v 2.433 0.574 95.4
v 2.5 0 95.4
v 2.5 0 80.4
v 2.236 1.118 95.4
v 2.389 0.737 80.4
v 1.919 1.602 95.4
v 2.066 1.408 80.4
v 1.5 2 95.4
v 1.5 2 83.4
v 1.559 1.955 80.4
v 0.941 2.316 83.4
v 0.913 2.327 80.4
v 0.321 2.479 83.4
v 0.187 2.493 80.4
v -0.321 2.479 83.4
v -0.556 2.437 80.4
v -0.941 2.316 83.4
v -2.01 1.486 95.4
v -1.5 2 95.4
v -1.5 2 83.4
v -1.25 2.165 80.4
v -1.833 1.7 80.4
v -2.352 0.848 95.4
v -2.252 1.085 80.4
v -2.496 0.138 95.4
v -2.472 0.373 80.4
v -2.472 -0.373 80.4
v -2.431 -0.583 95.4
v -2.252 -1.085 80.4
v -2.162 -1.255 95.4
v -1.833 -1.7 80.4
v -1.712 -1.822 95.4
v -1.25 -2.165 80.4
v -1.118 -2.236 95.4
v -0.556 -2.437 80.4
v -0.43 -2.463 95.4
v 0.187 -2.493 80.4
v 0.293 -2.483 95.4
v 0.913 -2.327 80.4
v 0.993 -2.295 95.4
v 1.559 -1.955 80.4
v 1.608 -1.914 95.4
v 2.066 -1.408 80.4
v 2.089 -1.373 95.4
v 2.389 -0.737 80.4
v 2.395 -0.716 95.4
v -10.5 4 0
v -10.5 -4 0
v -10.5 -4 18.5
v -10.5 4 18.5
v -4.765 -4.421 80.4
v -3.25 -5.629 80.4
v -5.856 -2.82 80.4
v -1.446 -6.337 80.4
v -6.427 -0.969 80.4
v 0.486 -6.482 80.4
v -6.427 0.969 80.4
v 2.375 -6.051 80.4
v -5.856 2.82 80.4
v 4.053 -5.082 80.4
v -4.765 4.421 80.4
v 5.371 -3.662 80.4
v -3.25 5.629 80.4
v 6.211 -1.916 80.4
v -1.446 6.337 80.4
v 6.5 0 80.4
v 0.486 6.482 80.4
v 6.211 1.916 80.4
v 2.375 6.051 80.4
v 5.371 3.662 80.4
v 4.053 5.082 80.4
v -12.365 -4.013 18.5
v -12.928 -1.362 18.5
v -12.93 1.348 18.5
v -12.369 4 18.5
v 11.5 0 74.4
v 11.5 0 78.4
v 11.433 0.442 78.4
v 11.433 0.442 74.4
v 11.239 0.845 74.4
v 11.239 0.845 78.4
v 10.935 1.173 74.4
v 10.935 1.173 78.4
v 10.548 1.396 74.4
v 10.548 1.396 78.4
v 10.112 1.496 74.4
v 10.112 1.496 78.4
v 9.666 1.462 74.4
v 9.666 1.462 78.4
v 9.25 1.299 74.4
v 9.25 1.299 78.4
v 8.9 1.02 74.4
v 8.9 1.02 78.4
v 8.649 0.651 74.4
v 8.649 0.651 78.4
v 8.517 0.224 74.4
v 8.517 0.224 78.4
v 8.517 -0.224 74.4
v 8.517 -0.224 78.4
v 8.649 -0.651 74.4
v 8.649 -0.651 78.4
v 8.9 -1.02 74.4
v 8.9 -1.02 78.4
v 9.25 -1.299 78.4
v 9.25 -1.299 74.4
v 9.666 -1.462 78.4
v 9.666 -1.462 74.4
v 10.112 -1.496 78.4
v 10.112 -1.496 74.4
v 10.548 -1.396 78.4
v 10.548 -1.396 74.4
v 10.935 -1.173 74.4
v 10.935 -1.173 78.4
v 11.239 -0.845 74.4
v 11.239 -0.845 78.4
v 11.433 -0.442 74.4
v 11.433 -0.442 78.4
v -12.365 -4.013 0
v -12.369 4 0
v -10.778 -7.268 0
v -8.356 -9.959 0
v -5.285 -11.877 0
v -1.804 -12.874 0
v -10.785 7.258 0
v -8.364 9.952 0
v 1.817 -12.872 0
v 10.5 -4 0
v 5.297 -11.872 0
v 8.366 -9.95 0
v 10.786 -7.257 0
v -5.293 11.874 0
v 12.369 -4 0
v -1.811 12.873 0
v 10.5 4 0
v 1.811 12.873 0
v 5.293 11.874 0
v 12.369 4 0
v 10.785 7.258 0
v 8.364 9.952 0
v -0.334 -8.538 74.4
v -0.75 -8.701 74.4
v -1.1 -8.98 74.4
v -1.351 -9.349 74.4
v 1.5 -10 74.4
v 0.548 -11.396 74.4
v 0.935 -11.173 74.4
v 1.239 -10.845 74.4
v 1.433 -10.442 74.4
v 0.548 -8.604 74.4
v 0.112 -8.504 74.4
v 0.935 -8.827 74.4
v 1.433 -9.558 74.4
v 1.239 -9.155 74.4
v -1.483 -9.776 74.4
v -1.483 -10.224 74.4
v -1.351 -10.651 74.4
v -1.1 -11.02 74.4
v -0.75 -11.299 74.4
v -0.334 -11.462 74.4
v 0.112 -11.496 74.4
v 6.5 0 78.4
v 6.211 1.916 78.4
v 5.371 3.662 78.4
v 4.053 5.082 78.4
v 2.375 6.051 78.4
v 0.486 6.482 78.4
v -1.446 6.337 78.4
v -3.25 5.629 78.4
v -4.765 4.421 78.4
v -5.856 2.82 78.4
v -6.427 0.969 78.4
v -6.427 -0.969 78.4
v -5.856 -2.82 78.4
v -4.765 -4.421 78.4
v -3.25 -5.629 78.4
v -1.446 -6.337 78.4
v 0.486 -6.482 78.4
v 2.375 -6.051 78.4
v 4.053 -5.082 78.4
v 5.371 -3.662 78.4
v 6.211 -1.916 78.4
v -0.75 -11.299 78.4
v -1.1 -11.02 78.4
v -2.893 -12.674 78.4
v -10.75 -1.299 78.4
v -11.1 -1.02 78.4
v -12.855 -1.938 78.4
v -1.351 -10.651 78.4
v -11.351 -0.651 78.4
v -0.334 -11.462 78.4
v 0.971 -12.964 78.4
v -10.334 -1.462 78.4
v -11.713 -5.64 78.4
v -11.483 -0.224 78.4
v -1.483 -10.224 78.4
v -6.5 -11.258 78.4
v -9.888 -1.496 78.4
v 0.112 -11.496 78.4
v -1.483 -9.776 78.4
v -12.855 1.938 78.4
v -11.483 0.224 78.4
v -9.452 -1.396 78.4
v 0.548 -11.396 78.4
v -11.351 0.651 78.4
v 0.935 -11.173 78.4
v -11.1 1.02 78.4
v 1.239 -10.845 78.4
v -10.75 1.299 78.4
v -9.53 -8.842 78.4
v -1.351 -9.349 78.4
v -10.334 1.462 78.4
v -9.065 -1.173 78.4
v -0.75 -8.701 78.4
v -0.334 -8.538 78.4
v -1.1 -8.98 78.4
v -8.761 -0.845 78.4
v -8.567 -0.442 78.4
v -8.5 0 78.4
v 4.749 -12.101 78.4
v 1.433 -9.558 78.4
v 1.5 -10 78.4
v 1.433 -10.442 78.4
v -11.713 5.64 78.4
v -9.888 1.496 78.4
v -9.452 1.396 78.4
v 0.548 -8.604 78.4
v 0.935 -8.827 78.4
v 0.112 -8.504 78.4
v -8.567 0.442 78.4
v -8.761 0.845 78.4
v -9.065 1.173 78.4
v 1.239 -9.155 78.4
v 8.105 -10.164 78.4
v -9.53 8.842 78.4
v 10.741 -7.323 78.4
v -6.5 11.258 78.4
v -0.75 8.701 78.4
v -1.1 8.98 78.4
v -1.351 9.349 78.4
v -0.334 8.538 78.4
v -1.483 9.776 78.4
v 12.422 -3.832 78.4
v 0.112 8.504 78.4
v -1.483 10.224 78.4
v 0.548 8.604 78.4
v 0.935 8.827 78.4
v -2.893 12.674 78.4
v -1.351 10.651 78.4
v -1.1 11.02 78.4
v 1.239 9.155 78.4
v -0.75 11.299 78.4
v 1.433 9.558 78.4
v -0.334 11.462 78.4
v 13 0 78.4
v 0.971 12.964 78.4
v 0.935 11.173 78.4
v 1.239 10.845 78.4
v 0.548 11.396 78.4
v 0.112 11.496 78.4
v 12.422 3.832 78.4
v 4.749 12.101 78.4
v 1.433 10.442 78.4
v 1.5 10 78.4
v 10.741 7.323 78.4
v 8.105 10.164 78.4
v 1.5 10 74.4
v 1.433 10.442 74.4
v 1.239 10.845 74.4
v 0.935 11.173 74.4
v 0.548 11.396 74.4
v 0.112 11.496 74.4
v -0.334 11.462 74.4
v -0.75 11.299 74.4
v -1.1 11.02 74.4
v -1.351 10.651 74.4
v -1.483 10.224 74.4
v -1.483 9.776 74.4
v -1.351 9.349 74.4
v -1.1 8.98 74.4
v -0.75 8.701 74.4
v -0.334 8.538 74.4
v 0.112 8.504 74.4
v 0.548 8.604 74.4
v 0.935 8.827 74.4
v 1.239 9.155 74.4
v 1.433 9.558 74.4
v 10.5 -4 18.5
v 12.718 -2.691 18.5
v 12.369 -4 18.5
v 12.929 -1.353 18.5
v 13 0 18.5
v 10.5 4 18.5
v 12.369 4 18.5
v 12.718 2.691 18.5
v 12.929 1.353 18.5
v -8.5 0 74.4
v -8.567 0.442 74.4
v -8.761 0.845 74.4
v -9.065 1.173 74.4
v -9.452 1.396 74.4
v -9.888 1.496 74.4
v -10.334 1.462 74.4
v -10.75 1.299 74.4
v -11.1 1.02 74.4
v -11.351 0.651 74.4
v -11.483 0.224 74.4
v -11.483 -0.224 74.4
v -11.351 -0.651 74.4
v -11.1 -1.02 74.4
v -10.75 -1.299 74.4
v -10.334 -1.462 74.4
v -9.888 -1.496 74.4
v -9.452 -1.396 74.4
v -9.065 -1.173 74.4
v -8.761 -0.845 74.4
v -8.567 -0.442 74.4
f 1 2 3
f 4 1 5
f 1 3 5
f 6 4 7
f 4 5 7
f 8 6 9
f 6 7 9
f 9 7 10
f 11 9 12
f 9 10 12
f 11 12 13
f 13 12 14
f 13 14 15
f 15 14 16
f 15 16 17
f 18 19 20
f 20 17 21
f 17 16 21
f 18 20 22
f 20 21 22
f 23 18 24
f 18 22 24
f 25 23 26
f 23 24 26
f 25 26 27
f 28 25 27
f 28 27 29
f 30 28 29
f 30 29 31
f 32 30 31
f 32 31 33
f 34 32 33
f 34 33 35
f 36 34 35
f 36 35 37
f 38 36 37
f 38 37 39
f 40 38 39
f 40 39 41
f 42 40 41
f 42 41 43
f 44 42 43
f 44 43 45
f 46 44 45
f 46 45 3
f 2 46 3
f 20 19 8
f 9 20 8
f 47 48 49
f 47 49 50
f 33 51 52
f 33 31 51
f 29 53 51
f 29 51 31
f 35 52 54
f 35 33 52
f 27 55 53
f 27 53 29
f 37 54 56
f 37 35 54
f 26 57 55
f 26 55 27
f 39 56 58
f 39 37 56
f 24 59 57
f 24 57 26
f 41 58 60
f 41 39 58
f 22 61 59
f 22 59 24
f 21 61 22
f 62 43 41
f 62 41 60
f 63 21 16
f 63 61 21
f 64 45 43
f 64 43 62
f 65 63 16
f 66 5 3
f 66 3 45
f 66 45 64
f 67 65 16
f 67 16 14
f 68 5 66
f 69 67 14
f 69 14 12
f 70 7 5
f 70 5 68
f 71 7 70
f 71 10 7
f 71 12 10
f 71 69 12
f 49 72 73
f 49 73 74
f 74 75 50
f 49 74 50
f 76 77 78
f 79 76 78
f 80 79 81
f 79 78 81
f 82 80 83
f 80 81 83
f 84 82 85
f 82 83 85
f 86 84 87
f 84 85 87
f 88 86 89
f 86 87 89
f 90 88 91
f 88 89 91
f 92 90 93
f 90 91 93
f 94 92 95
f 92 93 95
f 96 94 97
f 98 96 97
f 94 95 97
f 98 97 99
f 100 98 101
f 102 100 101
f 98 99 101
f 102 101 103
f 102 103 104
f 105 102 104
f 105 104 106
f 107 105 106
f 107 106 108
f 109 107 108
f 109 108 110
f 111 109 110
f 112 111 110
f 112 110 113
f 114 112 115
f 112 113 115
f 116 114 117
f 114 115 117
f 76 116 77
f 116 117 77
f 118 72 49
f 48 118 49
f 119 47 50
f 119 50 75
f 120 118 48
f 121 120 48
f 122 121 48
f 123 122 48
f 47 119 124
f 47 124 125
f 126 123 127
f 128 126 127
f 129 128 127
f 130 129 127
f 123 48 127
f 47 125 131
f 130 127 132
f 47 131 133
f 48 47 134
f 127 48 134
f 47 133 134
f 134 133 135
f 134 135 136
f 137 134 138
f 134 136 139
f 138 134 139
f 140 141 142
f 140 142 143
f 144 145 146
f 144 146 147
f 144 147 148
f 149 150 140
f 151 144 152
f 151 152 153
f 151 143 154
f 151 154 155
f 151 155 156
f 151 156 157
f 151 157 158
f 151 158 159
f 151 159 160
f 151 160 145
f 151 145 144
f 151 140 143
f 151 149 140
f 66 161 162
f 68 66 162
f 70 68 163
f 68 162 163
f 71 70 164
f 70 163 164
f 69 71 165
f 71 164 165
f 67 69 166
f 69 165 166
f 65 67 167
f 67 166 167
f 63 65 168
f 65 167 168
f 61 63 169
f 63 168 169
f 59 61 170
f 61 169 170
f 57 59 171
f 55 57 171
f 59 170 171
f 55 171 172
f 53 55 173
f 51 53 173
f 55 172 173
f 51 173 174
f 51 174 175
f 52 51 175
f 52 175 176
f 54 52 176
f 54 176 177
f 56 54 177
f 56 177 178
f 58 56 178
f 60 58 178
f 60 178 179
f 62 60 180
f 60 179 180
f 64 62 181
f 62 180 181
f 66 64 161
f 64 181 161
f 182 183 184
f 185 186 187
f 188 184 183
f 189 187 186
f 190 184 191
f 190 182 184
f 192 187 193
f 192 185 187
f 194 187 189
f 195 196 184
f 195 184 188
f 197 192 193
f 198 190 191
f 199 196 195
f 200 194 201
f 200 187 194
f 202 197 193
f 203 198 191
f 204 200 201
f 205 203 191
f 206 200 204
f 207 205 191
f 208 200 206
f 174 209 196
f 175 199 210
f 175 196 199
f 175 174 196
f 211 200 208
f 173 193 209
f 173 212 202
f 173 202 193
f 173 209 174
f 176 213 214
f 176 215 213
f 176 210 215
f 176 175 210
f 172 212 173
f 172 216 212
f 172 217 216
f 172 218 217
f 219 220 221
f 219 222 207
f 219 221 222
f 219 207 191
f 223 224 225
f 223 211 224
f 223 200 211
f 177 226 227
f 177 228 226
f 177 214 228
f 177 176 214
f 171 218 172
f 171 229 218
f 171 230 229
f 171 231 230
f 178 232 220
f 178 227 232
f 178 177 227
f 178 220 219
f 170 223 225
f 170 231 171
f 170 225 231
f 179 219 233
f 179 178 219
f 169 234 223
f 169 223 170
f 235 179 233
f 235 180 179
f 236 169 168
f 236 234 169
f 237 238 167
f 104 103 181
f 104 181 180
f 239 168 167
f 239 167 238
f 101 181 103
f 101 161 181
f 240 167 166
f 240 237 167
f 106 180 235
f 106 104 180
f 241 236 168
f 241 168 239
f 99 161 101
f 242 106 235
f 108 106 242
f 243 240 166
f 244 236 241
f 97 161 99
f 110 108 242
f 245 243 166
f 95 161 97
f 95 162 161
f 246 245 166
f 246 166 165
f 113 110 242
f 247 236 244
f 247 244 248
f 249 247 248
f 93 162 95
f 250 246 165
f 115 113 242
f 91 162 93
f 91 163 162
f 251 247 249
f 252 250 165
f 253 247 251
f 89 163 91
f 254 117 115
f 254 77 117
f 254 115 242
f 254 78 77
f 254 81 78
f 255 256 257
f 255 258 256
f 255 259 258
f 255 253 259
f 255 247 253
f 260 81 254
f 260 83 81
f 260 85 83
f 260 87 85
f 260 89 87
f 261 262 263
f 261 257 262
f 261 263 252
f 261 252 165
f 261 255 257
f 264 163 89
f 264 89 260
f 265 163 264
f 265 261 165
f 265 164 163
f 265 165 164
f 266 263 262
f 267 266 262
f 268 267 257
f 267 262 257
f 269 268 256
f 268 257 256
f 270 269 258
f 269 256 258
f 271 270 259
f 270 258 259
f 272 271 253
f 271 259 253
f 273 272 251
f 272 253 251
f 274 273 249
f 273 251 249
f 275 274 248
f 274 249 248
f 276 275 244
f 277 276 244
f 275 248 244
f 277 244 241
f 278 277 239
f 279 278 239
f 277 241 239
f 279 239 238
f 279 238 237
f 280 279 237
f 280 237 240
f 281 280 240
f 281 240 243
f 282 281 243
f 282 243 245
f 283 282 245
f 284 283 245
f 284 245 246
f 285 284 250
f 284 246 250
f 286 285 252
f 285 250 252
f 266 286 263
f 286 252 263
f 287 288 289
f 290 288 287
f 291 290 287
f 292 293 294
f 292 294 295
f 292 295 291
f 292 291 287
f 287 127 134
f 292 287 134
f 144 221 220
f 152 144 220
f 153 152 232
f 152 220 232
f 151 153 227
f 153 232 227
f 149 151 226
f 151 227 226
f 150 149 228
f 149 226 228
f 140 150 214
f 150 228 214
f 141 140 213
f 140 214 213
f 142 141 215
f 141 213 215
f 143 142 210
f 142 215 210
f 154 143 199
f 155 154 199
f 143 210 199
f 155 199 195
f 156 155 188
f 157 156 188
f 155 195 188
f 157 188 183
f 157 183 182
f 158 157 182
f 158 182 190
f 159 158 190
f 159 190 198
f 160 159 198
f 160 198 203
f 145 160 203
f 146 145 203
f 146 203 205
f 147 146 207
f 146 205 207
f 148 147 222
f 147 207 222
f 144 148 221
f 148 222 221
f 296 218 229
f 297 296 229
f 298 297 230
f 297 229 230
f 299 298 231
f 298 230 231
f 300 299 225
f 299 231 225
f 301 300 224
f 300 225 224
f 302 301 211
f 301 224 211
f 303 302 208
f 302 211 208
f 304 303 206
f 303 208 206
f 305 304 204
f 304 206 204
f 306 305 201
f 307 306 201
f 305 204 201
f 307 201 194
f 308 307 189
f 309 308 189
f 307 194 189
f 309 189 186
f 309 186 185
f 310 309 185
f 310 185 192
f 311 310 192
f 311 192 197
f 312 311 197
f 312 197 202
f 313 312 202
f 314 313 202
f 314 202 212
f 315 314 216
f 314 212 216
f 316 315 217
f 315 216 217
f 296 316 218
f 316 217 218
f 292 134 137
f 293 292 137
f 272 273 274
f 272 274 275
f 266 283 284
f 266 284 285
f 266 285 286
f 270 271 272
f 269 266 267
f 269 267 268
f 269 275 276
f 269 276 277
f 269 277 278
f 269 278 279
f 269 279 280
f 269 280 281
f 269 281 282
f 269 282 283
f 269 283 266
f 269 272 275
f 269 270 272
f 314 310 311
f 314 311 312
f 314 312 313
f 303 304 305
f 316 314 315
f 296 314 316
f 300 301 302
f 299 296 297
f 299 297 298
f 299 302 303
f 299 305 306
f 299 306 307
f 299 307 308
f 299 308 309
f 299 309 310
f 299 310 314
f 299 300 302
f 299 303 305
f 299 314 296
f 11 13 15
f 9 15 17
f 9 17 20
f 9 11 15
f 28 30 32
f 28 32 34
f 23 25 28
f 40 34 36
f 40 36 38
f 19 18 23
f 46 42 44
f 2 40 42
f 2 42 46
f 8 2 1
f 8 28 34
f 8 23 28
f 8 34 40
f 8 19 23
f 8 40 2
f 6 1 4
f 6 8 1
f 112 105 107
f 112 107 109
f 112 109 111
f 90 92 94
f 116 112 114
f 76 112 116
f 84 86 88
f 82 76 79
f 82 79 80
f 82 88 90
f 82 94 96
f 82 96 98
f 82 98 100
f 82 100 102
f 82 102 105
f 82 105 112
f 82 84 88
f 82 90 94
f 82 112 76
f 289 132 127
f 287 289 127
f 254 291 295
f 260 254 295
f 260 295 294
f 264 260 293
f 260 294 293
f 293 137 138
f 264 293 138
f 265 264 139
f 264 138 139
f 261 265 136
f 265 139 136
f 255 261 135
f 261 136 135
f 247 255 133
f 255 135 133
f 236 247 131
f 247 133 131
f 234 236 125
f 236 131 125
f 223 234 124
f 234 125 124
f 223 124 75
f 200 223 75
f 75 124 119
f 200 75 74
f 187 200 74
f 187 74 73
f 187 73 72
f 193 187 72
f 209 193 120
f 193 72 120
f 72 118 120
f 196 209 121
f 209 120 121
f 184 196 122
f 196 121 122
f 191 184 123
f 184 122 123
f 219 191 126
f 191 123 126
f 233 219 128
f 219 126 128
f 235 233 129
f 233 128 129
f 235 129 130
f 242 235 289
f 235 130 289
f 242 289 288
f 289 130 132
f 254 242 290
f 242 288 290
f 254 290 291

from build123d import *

# Parameters (mm, degrees)
ESQUISSE1_R             = 13
BOSS_EXTRU_1_DEPTH      = 78.4
ESQUISSE2_R             = 2.5
BOSS_EXTRU_2_DEPTH      = 17
ENL_V_MAT_EXTRU_1_DEPTH = 18.5
ESQUISSE4_R             = 6.5
ESQUISSE4_R_2           = 2.5
BOSS_EXTRU_3_DEPTH      = 2
ESQUISSE5_R             = 1.5
ENL_V_MAT_EXTRU_2_DEPTH = 4
ENL_V_START             = -12
ENL_V_MAT_EXTRU_3_DEPTH = 12


with BuildPart() as part:
    # Esquisse1 → Boss.-Extru.1 (new body)
    with BuildSketch(Plane.XY):
        Circle(ESQUISSE1_R)
    extrude(amount=BOSS_EXTRU_1_DEPTH)

    # Esquisse2 → Boss.-Extru.2 (add)
    with BuildSketch(Plane.XY.offset(78.4)):
        Circle(ESQUISSE2_R)
    extrude(amount=BOSS_EXTRU_2_DEPTH)

    # Esquisse3 → Enlèv. mat.-Extru.1 (cut)
    with BuildSketch(Plane(origin=(0, 0, 0), x_dir=(-1, 0, 0), z_dir=(0, 0, -1))):
        with BuildLine():
            Line((-10.5, 0), (-10.5, 4))
            Line((-10.5, 4), (-12.369316877, 4))
            ThreePointArc((-12.369316877, 4), (-13, 0), (-12.369316877, -4))
            Line((-12.369316877, -4), (-10.5, -4))
            Line((-10.5, -4), (-10.5, 0))
        make_face()
        with BuildLine():
            Line((10.5, 0), (10.5, 4))
            Line((10.5, 4), (12.369316877, 4))
            ThreePointArc((12.369316877, 4), (12.99999812, -0.006990598), (12.365007817, -4.013300596))
            Line((12.365007817, -4.013300596), (10.5, -4))
            Line((10.5, -4), (10.5, 0))
        make_face()
    extrude(amount=-ENL_V_MAT_EXTRU_1_DEPTH, mode=Mode.SUBTRACT)

    # Esquisse4 → Boss.-Extru.3 (add)
    with BuildSketch(Plane.XY.offset(78.4)):
        Circle(ESQUISSE4_R)
        Circle(ESQUISSE4_R_2, mode=Mode.SUBTRACT)
    extrude(amount=BOSS_EXTRU_3_DEPTH)

    # Esquisse5 → Enlèv. mat.-Extru.2 (cut)
    with BuildSketch(Plane.XY.offset(78.4)):
        with Locations((0, 10)):
            Circle(ESQUISSE5_R)
        with Locations((-10, 0)):
            Circle(ESQUISSE5_R)
        with Locations((0, -10)):
            Circle(ESQUISSE5_R)
        with Locations((10, 0)):
            Circle(ESQUISSE5_R)
    extrude(amount=-ENL_V_MAT_EXTRU_2_DEPTH, mode=Mode.SUBTRACT)

    # Esquisse6 → Enlèv. mat.-Extru.3 (cut)
    with BuildSketch(Plane.XY.offset(95.4).offset(ENL_V_START)):
        with BuildLine():
            Line((0, 2), (1.5, 2))
            ThreePointArc((1.5, 2), (0, 2.5), (-1.5, 2))
            Line((-1.5, 2), (0, 2))
        make_face()
    extrude(amount=ENL_V_MAT_EXTRU_3_DEPTH, mode=Mode.SUBTRACT)


solid = part.part
